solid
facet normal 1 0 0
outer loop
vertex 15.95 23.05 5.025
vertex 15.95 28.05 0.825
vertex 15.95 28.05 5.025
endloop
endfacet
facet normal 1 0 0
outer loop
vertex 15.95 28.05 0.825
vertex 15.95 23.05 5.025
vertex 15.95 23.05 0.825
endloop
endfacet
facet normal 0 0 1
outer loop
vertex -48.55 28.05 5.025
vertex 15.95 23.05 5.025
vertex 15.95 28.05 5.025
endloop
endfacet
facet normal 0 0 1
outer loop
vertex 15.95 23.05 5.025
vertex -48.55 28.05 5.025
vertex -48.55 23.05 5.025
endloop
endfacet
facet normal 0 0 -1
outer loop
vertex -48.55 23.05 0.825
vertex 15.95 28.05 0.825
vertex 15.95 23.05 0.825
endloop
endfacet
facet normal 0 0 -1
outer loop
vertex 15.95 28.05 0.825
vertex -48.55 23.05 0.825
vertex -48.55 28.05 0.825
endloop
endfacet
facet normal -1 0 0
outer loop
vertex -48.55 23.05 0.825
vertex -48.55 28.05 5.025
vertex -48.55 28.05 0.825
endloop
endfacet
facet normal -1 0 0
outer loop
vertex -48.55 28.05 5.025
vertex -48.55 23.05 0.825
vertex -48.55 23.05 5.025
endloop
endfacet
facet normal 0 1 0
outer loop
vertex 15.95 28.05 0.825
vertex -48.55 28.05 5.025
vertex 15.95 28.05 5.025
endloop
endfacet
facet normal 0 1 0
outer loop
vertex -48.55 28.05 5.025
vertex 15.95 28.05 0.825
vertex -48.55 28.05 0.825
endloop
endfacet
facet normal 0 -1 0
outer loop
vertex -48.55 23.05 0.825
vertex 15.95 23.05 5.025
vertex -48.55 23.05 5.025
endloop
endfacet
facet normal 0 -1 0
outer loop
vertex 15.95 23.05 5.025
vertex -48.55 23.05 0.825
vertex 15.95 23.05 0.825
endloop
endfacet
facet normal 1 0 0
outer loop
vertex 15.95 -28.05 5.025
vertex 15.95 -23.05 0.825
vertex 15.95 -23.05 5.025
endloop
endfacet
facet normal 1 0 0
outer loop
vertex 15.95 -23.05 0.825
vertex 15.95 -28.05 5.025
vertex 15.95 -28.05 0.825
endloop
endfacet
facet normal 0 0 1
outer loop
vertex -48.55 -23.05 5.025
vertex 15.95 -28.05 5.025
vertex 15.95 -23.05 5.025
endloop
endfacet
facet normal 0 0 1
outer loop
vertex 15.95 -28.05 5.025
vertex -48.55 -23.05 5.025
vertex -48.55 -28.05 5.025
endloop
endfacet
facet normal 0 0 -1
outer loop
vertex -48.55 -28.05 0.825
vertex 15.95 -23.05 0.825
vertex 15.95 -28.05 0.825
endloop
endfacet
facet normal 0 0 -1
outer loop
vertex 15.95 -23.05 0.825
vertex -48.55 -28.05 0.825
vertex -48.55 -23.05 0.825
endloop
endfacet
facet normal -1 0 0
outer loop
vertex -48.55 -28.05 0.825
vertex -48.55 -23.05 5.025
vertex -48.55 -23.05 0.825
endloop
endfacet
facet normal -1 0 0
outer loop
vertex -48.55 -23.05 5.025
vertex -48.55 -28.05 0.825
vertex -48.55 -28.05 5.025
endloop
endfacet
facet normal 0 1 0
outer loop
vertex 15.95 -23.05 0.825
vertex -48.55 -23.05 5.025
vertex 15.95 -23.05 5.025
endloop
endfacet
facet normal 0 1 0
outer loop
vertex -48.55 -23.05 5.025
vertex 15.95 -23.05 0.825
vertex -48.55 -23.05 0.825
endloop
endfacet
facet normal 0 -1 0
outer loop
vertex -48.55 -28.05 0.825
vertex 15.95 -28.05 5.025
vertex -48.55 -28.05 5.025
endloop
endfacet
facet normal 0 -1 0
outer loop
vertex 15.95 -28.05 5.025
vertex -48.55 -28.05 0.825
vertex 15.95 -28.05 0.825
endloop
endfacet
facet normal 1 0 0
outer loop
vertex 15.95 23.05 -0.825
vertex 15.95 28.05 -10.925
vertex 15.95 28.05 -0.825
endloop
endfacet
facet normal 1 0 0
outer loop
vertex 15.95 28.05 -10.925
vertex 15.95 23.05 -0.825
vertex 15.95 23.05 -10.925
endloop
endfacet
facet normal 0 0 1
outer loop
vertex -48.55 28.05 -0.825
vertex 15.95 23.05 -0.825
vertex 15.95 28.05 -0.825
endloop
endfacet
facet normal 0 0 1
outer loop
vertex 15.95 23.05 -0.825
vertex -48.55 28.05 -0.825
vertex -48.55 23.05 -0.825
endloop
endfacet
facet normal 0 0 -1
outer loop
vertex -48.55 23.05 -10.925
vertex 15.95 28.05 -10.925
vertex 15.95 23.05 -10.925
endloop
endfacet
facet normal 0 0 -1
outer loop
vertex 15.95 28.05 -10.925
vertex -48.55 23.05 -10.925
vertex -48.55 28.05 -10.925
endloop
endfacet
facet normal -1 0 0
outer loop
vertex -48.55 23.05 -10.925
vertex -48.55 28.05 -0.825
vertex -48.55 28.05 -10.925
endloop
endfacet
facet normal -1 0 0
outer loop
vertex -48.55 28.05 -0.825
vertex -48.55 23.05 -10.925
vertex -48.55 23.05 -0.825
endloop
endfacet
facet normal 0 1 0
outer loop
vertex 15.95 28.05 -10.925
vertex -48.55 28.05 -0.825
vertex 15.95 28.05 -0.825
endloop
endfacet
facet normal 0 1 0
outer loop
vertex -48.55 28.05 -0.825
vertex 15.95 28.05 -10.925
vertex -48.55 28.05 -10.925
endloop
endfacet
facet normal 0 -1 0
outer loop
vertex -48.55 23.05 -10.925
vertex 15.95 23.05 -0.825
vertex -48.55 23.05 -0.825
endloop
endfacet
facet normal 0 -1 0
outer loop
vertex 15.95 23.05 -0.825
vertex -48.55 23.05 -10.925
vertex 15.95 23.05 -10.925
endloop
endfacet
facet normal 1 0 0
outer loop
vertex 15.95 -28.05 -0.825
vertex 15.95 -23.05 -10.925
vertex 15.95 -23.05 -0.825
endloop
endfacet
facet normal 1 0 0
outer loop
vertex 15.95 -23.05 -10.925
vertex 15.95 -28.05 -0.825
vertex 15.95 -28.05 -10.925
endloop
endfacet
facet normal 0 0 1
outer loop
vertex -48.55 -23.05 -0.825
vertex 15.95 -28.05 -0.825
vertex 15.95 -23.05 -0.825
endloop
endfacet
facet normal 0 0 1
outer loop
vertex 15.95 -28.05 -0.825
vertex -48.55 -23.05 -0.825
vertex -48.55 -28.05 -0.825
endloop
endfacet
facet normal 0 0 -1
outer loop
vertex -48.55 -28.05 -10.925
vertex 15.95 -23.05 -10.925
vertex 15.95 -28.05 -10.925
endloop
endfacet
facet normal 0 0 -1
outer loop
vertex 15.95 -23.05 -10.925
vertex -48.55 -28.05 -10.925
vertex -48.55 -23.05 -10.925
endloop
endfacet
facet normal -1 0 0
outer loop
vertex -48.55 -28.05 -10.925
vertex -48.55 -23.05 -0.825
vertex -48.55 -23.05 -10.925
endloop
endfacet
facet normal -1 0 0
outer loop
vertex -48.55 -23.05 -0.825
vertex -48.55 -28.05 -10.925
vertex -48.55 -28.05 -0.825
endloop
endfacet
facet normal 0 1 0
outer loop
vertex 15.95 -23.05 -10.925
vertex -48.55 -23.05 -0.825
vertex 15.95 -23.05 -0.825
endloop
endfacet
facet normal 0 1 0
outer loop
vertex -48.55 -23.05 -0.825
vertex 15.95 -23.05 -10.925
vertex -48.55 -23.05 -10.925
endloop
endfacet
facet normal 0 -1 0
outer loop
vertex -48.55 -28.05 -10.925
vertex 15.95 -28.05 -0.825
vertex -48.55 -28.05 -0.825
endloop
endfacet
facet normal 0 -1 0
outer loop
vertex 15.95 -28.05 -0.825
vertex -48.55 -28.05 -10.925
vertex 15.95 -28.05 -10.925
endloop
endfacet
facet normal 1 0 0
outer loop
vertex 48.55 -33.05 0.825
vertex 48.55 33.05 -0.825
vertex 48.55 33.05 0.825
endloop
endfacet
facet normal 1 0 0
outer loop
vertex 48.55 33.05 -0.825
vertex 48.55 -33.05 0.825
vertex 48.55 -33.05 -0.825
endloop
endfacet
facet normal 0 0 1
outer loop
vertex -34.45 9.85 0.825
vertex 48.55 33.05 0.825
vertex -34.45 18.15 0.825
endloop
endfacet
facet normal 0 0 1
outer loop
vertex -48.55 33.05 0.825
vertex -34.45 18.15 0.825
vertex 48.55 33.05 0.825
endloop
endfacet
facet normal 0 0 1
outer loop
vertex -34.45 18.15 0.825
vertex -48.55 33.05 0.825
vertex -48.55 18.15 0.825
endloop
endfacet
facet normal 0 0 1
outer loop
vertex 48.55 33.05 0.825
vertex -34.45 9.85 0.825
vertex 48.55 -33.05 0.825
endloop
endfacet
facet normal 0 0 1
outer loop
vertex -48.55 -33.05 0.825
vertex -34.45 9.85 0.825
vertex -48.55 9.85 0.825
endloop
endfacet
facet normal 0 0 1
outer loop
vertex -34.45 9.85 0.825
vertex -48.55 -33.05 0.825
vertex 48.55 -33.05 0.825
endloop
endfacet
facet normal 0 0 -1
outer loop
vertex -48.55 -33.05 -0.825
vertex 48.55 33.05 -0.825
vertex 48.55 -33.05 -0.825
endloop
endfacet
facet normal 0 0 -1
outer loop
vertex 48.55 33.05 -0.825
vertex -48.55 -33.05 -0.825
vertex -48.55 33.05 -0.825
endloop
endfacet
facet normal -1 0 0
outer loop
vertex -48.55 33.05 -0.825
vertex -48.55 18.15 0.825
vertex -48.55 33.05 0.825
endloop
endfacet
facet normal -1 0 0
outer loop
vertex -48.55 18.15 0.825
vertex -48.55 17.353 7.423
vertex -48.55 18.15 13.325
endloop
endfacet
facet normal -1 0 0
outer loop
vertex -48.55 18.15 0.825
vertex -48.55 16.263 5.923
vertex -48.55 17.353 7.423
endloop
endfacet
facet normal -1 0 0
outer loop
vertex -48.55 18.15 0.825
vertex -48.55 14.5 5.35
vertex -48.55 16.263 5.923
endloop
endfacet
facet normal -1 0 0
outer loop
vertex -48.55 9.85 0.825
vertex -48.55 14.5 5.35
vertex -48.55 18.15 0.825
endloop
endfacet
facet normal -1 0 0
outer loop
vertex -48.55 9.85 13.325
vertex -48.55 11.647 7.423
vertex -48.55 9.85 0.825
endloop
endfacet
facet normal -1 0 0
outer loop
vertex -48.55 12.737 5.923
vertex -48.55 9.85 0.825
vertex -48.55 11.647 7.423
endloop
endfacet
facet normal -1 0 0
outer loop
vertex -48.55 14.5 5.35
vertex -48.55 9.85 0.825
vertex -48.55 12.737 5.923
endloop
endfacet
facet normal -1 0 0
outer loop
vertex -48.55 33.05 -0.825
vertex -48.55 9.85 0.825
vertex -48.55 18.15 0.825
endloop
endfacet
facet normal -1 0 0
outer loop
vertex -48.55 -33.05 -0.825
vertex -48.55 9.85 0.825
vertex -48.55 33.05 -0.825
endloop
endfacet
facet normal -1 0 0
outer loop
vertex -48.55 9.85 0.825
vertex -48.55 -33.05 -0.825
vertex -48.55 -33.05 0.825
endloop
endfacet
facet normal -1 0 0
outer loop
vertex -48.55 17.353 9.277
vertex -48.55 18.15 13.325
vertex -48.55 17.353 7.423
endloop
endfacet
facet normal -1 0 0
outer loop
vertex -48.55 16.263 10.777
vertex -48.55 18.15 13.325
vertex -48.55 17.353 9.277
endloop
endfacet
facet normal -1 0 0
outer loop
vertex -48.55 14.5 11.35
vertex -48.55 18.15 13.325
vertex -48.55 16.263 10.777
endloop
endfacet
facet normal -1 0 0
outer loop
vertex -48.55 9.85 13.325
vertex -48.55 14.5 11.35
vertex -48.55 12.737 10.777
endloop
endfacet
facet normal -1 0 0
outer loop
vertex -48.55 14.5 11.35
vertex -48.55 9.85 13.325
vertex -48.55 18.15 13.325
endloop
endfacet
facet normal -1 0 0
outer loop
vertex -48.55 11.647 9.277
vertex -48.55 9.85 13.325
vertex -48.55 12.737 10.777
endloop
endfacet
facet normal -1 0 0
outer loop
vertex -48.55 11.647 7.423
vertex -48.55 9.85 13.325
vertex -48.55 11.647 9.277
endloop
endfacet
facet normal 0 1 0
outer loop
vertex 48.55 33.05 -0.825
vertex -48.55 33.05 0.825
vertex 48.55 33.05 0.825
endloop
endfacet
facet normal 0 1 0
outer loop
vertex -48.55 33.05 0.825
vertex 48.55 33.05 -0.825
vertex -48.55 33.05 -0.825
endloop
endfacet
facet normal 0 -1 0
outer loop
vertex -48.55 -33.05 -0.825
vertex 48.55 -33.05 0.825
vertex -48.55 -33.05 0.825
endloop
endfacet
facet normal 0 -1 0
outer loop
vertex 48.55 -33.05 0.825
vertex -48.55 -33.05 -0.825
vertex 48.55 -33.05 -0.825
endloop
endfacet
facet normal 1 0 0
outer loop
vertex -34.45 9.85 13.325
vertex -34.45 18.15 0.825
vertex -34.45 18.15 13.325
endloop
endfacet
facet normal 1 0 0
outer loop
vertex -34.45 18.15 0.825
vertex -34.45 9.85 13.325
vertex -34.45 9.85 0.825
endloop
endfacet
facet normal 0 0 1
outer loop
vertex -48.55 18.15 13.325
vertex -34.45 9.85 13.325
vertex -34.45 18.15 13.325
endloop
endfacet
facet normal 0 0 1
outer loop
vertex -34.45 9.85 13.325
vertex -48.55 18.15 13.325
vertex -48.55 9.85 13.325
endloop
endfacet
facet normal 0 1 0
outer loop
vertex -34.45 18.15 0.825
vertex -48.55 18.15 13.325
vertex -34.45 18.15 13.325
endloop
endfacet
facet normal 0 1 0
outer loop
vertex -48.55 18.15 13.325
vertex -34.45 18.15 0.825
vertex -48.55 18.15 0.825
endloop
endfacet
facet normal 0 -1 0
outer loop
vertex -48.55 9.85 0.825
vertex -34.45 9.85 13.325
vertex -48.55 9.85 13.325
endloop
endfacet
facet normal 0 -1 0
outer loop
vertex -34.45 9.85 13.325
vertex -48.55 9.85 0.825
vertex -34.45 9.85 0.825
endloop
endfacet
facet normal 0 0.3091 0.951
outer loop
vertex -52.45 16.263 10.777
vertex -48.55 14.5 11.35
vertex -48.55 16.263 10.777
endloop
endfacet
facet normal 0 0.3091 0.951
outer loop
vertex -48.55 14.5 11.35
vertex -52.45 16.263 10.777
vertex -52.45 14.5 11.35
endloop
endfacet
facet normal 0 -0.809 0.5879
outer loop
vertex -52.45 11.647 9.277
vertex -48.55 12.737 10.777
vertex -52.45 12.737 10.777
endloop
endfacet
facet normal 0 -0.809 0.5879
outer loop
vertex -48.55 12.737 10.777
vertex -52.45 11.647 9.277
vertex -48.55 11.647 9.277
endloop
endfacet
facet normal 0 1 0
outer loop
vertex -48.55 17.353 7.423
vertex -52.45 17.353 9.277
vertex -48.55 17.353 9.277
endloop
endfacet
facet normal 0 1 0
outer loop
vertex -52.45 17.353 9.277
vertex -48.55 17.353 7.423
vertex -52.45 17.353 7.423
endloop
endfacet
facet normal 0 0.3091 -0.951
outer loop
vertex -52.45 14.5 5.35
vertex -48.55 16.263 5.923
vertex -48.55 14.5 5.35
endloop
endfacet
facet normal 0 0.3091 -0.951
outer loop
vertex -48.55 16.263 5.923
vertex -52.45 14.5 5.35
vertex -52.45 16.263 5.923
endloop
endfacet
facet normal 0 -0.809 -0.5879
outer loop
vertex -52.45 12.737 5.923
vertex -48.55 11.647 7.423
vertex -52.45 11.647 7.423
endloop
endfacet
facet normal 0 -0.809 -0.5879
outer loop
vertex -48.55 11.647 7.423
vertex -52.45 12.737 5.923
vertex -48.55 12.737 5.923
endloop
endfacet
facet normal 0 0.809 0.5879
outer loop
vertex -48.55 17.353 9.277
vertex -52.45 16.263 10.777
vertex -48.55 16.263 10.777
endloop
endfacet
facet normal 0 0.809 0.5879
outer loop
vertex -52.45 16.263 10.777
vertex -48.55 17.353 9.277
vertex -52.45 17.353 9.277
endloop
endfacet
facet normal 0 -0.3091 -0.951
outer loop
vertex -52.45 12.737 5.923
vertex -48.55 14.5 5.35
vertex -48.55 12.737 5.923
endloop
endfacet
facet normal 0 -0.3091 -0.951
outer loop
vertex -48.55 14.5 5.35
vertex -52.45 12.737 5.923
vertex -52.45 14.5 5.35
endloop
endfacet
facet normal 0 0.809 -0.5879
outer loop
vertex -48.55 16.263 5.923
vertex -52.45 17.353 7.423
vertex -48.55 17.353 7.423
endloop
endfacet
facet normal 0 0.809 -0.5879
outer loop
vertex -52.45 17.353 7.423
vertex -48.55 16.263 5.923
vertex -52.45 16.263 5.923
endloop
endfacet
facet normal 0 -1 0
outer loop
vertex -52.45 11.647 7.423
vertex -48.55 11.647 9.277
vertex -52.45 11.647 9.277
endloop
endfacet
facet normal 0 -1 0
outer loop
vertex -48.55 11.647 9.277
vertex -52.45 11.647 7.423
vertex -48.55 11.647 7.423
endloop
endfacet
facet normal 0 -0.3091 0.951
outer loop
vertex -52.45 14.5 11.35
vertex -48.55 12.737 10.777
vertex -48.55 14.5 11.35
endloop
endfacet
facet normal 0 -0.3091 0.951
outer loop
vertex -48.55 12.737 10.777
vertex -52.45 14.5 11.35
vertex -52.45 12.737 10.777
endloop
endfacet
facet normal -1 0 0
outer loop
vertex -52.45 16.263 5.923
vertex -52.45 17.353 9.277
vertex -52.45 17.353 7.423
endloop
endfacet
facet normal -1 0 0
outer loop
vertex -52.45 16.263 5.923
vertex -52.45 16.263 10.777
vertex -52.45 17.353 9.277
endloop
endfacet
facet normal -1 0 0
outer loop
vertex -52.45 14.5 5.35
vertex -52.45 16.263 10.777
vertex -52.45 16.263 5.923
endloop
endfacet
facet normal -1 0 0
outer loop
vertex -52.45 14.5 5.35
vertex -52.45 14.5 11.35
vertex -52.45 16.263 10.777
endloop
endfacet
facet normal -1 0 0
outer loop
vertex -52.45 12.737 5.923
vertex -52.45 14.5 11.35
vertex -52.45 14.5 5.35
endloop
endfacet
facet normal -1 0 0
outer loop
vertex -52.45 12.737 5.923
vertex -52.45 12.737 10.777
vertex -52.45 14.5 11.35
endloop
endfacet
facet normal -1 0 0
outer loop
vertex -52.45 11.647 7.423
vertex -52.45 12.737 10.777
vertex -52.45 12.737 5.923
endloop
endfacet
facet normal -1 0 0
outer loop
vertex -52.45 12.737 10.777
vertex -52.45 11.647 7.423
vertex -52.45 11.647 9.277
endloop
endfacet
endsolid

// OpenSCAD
stm_pcb_thickness = 1.65;
stm_width_x = 97.1;
stm_width_y = 66.1;
stm_pin_length_down = 10.1;
stm_pin_length_up = 4.2;
stm_pin_dual_row_width_y = 5;
stm_pin_dual_row_width_x = 64.5;
stm_pin_dual_row_distance_from_border = 5;
stm_height_above_pcb_audio = 12.5;
stm_audio_width_x = 14.1;
stm_audio_width_y = 8.3;
stm_audio_pos_x = -(stm_width_x-stm_audio_width_x)/2;
stm_audio_pos_y = 14;
stm_audio_jack_diameter = 6;
stm_audio_jack_length = 3.9;
stm_audio_jack_pos_x = -(stm_width_x)/2 - stm_audio_jack_length/2;
stm_audio_jack_pos_y = 14.5;
stm_audio_jack_pos_z = 6.7 +stm_pcb_thickness;

stm_height_above_pcb_buttons = 9.8;
stm_height_above_pcb_jumpers = 8.5;
stm_height_overall = 3.6;




module stm32f4discovery(){
	union(){
		//PCB
		cube(size=[stm_width_x, stm_width_y, stm_pcb_thickness], center=true);
		//dual row pin headers
		translate([-stm_width_x/2,0,0]){
			translate([0,0,stm_pcb_thickness/2]){
				translate([0,stm_width_y / 2 - stm_pin_dual_row_width_y - stm_pin_dual_row_distance_from_border,0]) cube(size=[stm_pin_dual_row_width_x, stm_pin_dual_row_width_y, stm_pin_length_up]);
				translate([0, - stm_width_y / 2 + stm_pin_dual_row_distance_from_border,0]) cube(size=[stm_pin_dual_row_width_x, stm_pin_dual_row_width_y, stm_pin_length_up]);
			}
			translate([0,0,-stm_pcb_thickness/2-stm_pin_length_down]){
				translate([0,stm_width_y / 2 - stm_pin_dual_row_width_y - stm_pin_dual_row_distance_from_border,0]) cube(size=[stm_pin_dual_row_width_x, stm_pin_dual_row_width_y, stm_pin_length_down]);
				translate([0, - stm_width_y / 2 + stm_pin_dual_row_distance_from_border,0]) cube(size=[stm_pin_dual_row_width_x, stm_pin_dual_row_width_y, stm_pin_length_down]);
			}
		}
		//audio jack cubic part
		translate([stm_audio_pos_x,stm_audio_pos_y, (stm_height_above_pcb_audio+
stm_pcb_thickness)/2]) cube(size=[stm_audio_width_x, stm_audio_width_y, stm_height_above_pcb_audio],center=true);
		//audio jack round part
		translate([stm_audio_jack_pos_x,stm_audio_jack_pos_y,stm_audio_jack_pos_z]) {rotate(a=[0,90,0]) cylinder(h=stm_audio_jack_length, r=stm_audio_jack_diameter/2, center=true);}
	}
}

stm32f4discovery();
